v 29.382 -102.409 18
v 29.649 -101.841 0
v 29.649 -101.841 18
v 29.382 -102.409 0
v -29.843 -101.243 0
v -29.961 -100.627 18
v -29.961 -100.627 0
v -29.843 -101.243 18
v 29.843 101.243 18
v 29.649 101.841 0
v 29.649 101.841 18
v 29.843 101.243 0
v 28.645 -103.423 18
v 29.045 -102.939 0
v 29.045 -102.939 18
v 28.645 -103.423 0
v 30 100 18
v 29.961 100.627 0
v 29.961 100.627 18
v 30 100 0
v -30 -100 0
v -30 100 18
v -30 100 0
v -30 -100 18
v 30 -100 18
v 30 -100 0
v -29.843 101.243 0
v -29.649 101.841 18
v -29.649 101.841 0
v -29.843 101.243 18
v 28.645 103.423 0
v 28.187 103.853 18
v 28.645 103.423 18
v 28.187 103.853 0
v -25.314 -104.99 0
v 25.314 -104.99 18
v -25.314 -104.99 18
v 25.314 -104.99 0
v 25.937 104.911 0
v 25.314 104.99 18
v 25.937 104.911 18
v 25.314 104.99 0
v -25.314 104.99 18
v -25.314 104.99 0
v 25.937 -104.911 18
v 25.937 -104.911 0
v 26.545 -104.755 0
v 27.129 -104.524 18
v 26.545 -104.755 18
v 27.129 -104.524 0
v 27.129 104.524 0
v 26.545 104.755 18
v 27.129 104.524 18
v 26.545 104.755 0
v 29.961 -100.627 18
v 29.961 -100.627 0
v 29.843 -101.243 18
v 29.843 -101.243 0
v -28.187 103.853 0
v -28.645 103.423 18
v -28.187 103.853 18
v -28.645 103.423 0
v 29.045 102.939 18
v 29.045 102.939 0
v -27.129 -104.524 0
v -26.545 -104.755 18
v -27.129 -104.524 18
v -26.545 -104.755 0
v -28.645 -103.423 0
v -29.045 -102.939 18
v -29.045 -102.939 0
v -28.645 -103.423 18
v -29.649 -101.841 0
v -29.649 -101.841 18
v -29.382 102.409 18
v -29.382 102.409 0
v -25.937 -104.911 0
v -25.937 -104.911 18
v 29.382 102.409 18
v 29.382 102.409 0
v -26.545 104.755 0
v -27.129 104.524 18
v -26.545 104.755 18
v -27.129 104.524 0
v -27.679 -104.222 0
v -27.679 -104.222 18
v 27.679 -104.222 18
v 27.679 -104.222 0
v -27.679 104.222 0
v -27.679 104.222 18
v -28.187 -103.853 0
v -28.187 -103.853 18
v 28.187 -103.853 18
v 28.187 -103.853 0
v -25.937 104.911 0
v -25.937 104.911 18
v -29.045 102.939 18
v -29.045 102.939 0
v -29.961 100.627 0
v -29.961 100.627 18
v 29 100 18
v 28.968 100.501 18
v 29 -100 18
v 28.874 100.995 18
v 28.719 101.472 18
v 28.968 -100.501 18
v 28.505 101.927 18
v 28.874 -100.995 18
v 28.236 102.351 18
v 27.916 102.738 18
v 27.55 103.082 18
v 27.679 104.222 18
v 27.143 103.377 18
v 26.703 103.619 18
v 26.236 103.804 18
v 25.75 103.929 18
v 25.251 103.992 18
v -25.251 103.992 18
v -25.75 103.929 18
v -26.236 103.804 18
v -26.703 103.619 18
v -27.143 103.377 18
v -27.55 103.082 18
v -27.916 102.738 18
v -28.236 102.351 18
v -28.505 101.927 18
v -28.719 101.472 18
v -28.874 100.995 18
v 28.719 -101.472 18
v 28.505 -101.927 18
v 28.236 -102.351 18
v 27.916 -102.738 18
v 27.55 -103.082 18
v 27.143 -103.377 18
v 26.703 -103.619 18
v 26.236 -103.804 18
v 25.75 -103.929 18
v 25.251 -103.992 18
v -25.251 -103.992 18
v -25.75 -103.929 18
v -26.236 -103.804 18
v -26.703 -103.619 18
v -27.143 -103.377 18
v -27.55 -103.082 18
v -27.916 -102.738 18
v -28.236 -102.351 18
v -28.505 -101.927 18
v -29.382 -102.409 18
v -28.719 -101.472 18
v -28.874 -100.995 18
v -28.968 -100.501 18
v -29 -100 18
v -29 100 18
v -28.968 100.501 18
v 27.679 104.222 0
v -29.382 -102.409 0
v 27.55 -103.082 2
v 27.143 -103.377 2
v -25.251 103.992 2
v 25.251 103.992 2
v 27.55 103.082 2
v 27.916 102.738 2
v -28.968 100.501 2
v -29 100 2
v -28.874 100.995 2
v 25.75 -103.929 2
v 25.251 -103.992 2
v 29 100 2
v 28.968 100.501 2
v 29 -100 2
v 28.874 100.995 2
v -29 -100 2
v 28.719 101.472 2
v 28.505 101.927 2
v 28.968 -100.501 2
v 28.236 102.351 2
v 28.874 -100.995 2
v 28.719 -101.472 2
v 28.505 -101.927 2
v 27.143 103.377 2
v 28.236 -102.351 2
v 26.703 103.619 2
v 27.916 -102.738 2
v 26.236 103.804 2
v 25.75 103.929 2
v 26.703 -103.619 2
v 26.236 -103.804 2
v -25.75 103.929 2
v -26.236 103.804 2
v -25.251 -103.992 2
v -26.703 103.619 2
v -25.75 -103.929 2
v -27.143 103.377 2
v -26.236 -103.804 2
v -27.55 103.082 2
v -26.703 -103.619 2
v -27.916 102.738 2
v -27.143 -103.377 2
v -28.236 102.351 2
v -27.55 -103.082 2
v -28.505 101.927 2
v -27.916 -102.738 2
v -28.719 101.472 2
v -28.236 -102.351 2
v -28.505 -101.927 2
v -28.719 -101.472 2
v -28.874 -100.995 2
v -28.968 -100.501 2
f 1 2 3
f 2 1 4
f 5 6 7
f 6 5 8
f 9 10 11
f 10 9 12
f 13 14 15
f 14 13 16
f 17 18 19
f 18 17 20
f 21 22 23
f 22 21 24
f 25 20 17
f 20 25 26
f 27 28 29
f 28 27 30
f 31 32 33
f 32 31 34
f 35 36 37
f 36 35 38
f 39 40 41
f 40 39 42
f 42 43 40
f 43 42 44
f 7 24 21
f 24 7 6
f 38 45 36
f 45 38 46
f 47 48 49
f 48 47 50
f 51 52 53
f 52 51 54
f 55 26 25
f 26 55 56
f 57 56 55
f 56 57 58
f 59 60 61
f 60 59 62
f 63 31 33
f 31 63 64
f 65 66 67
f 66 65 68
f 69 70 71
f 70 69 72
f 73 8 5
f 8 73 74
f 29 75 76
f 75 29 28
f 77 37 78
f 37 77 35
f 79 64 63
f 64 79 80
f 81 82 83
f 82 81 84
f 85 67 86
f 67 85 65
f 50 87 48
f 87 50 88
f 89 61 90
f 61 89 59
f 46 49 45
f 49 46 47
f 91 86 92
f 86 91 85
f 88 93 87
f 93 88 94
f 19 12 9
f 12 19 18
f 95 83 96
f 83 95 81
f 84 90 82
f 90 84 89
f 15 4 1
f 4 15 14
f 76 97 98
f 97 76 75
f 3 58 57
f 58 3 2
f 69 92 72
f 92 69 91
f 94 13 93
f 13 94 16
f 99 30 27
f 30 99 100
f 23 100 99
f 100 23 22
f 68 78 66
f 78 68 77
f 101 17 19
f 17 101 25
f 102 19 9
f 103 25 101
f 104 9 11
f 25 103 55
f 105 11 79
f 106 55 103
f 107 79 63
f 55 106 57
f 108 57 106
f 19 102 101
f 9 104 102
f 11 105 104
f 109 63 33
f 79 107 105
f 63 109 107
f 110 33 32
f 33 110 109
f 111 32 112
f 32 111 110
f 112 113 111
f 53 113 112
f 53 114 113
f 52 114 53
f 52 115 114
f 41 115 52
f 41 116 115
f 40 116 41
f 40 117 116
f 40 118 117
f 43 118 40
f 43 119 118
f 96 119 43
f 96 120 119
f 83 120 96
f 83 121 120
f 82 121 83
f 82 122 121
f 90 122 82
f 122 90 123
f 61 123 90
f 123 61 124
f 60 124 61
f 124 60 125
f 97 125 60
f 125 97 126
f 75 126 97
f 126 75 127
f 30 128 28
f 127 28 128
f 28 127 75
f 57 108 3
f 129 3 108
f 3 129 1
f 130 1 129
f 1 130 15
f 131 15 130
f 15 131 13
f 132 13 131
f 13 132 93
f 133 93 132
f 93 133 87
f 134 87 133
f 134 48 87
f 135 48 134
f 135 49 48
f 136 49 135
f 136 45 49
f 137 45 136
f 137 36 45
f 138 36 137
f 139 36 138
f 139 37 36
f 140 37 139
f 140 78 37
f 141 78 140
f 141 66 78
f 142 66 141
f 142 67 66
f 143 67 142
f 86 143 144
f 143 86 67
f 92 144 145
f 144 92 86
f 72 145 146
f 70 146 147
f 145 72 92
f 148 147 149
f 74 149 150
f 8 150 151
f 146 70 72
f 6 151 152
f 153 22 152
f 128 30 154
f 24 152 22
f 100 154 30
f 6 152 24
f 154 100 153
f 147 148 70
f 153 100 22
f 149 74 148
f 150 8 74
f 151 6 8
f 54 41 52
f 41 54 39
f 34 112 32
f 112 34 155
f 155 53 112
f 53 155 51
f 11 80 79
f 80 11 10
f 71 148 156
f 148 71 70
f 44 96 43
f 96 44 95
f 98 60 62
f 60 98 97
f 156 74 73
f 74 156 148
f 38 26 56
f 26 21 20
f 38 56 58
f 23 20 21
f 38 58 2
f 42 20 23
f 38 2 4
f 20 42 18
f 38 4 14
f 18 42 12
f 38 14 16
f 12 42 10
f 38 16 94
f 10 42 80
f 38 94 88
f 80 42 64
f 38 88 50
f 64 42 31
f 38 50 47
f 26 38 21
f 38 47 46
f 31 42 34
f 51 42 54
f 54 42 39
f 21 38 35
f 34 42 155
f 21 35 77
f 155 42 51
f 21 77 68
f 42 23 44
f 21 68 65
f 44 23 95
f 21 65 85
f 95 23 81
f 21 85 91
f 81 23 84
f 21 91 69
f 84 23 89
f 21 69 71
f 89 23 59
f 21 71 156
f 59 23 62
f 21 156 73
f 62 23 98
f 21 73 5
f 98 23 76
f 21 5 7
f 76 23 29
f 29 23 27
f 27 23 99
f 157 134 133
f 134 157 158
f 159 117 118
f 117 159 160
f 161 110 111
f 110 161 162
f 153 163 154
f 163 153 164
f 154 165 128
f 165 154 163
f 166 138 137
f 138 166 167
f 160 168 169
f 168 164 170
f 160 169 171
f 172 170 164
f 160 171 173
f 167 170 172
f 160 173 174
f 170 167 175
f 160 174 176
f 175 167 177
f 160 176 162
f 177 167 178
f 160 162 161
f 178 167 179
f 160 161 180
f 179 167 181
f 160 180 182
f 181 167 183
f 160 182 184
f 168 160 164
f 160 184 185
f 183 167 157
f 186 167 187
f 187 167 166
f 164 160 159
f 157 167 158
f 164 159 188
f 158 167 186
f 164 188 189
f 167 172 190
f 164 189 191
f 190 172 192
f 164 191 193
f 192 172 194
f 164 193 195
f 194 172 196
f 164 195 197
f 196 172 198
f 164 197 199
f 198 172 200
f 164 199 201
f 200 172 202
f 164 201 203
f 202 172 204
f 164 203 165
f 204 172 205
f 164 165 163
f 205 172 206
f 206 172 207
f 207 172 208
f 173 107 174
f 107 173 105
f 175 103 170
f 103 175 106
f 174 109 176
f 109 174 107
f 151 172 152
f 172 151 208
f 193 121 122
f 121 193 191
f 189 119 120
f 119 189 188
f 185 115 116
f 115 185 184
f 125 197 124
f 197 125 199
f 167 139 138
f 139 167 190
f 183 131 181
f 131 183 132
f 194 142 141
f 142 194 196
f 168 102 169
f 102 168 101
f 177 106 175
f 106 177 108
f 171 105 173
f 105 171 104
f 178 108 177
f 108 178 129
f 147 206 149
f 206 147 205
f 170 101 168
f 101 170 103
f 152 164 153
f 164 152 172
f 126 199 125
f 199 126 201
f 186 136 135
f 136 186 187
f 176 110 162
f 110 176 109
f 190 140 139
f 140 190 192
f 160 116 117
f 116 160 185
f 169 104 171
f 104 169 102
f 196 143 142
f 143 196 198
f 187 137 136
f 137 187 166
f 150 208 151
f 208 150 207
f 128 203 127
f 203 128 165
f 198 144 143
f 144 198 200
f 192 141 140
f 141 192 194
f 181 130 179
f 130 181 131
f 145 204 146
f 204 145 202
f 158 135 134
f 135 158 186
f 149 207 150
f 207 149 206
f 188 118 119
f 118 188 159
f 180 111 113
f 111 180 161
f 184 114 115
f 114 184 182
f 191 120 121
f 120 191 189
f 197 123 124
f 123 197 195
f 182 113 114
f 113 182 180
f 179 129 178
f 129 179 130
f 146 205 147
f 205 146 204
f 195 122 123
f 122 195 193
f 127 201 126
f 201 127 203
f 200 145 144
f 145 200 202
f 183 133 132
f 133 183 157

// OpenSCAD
$fn = 50;


difference() {
	union() {
		hull() {
			translate(v = [-25.0000000000, 100.0000000000, 0]) {
				cylinder(h = 18, r = 5);
			}
			translate(v = [25.0000000000, 100.0000000000, 0]) {
				cylinder(h = 18, r = 5);
			}
			translate(v = [-25.0000000000, -100.0000000000, 0]) {
				cylinder(h = 18, r = 5);
			}
			translate(v = [25.0000000000, -100.0000000000, 0]) {
				cylinder(h = 18, r = 5);
			}
		}
	}
	union() {
		translate(v = [0, 0, 2]) {
			hull() {
				translate(v = [-25.0000000000, 100.0000000000, 0]) {
					cylinder(h = 16, r = 4);
				}
				translate(v = [25.0000000000, 100.0000000000, 0]) {
					cylinder(h = 16, r = 4);
				}
				translate(v = [-25.0000000000, -100.0000000000, 0]) {
					cylinder(h = 16, r = 4);
				}
				translate(v = [25.0000000000, -100.0000000000, 0]) {
					cylinder(h = 16, r = 4);
				}
			}
		}
	}
}
